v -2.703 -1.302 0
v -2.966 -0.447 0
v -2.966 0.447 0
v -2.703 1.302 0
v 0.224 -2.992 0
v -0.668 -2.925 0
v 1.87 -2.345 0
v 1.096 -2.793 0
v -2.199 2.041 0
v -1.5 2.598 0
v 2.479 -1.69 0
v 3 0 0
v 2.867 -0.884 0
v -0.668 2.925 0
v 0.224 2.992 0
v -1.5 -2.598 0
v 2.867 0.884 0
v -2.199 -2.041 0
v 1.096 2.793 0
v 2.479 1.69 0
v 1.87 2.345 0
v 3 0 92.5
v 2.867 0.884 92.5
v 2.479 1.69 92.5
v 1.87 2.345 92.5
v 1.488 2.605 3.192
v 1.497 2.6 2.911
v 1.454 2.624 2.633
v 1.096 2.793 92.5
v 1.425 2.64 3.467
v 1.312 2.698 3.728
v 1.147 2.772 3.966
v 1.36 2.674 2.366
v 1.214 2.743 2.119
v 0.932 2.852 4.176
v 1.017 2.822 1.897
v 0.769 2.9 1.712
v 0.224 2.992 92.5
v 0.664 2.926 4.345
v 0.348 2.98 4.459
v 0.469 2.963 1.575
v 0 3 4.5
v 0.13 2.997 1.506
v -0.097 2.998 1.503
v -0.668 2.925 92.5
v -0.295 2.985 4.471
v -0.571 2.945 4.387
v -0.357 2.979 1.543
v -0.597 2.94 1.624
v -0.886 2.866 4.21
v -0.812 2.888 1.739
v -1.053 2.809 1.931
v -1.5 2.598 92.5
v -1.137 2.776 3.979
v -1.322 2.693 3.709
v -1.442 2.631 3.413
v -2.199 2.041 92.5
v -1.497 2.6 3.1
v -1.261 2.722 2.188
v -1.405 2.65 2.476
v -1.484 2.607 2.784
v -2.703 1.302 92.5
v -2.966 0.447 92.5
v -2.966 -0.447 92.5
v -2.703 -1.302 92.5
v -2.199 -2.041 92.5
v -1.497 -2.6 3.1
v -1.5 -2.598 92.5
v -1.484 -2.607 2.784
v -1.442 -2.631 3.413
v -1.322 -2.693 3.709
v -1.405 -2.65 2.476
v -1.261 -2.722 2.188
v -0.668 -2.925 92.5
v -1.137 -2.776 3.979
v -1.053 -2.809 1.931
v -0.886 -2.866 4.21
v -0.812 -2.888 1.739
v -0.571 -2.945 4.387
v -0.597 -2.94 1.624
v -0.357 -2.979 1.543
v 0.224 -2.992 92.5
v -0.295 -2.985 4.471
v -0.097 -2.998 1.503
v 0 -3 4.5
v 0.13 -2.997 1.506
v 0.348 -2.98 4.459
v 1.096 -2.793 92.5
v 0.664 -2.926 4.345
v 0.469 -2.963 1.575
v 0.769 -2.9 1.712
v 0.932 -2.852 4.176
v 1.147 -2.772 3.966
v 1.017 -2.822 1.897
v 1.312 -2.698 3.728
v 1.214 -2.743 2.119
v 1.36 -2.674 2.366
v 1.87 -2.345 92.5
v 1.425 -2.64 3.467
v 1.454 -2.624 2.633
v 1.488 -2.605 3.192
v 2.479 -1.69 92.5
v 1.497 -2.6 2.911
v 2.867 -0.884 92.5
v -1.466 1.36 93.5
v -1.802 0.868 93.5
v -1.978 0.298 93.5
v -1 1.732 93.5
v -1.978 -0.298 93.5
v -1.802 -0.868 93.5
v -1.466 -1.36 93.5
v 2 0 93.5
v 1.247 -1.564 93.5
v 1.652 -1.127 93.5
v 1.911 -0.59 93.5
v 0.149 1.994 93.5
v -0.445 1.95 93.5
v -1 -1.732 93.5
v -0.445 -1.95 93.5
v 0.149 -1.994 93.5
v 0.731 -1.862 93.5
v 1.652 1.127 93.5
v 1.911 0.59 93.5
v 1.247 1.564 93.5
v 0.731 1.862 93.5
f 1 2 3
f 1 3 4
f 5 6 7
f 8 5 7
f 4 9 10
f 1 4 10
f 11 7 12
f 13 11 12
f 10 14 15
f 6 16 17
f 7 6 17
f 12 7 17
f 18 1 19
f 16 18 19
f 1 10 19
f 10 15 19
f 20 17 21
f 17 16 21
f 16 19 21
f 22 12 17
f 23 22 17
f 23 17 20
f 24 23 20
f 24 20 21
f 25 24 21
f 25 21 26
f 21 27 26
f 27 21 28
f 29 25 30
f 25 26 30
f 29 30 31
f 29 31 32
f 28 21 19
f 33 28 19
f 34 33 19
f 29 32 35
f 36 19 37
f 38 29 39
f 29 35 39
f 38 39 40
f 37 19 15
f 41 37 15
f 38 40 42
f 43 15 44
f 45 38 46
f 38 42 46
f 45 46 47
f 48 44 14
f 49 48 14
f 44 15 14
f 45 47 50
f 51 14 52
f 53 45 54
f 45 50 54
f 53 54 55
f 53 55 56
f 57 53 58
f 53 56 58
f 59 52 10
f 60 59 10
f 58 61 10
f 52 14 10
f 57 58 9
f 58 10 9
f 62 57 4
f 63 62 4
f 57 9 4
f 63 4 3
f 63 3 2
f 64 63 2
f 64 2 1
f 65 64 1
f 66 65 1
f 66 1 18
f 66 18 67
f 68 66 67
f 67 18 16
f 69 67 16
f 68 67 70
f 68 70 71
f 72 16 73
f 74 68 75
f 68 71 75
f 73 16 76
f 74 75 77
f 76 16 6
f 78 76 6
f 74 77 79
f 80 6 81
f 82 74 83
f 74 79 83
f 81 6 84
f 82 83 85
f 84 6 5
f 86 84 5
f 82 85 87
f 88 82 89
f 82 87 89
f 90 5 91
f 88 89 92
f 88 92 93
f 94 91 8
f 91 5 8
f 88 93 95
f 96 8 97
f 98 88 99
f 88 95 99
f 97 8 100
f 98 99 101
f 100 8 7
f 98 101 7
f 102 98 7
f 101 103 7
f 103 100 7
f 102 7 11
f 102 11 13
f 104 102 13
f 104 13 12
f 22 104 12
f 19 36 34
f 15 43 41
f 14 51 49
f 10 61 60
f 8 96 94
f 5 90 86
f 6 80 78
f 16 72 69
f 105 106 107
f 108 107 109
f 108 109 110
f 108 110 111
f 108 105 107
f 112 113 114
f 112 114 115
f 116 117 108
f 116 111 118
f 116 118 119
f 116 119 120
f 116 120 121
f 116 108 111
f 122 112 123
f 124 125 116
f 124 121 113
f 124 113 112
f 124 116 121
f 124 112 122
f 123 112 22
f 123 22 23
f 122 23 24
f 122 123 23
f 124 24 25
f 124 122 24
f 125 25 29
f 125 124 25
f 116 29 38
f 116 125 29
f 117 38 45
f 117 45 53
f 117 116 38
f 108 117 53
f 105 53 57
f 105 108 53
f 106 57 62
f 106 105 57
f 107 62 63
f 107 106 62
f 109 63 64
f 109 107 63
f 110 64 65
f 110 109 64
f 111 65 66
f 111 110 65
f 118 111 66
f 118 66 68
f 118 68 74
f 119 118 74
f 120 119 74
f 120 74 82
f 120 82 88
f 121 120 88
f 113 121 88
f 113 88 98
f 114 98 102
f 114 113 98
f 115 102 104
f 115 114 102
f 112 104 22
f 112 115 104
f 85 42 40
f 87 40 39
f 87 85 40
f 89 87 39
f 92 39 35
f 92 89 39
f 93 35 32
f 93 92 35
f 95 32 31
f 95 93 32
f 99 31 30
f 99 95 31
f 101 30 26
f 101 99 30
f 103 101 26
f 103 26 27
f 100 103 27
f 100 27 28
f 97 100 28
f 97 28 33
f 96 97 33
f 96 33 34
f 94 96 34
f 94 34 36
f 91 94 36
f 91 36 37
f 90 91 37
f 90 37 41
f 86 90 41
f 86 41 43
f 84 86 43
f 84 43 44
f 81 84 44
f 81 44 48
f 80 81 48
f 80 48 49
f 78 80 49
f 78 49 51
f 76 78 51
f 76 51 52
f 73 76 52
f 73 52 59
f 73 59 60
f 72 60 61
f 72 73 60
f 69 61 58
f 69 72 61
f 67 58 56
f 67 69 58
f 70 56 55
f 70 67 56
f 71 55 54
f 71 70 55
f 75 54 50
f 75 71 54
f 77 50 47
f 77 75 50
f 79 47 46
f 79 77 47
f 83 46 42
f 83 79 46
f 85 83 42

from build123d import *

# Parameters (mm, degrees)
ESQUISSE1_R                  = 3
BOSS_EXTRU_1_DEPTH           = 93.5
ENL_V_MAT_EXTRU_1_DEPTH      = 94.596207188
ENL_V_MAT_EXTRU_1_DEPTH_BACK = 94.596207188
ESQUISSE2_R                  = 1.5
CHANFREIN1_SIZE              = 1


with BuildPart() as part:
    # Esquisse1 → Boss.-Extru.1 (new body)
    with BuildSketch(Plane.XY):
        Circle(ESQUISSE1_R)
    extrude(amount=BOSS_EXTRU_1_DEPTH)

    # Esquisse2 → Enlèv. mat.-Extru.1 (cut, two sides: drawn at the far end of the back side and taken through both)
    with BuildSketch(Plane(origin=(0, 0, 0), x_dir=(1, 0, 0), z_dir=(0, 1, 0)).offset(-ENL_V_MAT_EXTRU_1_DEPTH_BACK)):
        with Locations(Location((0, -3, 0), (0, 0, 270))):
            Circle(ESQUISSE2_R)
    extrude(amount=ENL_V_MAT_EXTRU_1_DEPTH + ENL_V_MAT_EXTRU_1_DEPTH_BACK, mode=Mode.SUBTRACT)

    # Chanfrein1
    chanfrein1_edges = [part.edges().sort_by_distance(p)[0] for p in [
        (-3, 0, 93.5),
    ]]
    chamfer(chanfrein1_edges, length=CHANFREIN1_SIZE)


solid = part.part
